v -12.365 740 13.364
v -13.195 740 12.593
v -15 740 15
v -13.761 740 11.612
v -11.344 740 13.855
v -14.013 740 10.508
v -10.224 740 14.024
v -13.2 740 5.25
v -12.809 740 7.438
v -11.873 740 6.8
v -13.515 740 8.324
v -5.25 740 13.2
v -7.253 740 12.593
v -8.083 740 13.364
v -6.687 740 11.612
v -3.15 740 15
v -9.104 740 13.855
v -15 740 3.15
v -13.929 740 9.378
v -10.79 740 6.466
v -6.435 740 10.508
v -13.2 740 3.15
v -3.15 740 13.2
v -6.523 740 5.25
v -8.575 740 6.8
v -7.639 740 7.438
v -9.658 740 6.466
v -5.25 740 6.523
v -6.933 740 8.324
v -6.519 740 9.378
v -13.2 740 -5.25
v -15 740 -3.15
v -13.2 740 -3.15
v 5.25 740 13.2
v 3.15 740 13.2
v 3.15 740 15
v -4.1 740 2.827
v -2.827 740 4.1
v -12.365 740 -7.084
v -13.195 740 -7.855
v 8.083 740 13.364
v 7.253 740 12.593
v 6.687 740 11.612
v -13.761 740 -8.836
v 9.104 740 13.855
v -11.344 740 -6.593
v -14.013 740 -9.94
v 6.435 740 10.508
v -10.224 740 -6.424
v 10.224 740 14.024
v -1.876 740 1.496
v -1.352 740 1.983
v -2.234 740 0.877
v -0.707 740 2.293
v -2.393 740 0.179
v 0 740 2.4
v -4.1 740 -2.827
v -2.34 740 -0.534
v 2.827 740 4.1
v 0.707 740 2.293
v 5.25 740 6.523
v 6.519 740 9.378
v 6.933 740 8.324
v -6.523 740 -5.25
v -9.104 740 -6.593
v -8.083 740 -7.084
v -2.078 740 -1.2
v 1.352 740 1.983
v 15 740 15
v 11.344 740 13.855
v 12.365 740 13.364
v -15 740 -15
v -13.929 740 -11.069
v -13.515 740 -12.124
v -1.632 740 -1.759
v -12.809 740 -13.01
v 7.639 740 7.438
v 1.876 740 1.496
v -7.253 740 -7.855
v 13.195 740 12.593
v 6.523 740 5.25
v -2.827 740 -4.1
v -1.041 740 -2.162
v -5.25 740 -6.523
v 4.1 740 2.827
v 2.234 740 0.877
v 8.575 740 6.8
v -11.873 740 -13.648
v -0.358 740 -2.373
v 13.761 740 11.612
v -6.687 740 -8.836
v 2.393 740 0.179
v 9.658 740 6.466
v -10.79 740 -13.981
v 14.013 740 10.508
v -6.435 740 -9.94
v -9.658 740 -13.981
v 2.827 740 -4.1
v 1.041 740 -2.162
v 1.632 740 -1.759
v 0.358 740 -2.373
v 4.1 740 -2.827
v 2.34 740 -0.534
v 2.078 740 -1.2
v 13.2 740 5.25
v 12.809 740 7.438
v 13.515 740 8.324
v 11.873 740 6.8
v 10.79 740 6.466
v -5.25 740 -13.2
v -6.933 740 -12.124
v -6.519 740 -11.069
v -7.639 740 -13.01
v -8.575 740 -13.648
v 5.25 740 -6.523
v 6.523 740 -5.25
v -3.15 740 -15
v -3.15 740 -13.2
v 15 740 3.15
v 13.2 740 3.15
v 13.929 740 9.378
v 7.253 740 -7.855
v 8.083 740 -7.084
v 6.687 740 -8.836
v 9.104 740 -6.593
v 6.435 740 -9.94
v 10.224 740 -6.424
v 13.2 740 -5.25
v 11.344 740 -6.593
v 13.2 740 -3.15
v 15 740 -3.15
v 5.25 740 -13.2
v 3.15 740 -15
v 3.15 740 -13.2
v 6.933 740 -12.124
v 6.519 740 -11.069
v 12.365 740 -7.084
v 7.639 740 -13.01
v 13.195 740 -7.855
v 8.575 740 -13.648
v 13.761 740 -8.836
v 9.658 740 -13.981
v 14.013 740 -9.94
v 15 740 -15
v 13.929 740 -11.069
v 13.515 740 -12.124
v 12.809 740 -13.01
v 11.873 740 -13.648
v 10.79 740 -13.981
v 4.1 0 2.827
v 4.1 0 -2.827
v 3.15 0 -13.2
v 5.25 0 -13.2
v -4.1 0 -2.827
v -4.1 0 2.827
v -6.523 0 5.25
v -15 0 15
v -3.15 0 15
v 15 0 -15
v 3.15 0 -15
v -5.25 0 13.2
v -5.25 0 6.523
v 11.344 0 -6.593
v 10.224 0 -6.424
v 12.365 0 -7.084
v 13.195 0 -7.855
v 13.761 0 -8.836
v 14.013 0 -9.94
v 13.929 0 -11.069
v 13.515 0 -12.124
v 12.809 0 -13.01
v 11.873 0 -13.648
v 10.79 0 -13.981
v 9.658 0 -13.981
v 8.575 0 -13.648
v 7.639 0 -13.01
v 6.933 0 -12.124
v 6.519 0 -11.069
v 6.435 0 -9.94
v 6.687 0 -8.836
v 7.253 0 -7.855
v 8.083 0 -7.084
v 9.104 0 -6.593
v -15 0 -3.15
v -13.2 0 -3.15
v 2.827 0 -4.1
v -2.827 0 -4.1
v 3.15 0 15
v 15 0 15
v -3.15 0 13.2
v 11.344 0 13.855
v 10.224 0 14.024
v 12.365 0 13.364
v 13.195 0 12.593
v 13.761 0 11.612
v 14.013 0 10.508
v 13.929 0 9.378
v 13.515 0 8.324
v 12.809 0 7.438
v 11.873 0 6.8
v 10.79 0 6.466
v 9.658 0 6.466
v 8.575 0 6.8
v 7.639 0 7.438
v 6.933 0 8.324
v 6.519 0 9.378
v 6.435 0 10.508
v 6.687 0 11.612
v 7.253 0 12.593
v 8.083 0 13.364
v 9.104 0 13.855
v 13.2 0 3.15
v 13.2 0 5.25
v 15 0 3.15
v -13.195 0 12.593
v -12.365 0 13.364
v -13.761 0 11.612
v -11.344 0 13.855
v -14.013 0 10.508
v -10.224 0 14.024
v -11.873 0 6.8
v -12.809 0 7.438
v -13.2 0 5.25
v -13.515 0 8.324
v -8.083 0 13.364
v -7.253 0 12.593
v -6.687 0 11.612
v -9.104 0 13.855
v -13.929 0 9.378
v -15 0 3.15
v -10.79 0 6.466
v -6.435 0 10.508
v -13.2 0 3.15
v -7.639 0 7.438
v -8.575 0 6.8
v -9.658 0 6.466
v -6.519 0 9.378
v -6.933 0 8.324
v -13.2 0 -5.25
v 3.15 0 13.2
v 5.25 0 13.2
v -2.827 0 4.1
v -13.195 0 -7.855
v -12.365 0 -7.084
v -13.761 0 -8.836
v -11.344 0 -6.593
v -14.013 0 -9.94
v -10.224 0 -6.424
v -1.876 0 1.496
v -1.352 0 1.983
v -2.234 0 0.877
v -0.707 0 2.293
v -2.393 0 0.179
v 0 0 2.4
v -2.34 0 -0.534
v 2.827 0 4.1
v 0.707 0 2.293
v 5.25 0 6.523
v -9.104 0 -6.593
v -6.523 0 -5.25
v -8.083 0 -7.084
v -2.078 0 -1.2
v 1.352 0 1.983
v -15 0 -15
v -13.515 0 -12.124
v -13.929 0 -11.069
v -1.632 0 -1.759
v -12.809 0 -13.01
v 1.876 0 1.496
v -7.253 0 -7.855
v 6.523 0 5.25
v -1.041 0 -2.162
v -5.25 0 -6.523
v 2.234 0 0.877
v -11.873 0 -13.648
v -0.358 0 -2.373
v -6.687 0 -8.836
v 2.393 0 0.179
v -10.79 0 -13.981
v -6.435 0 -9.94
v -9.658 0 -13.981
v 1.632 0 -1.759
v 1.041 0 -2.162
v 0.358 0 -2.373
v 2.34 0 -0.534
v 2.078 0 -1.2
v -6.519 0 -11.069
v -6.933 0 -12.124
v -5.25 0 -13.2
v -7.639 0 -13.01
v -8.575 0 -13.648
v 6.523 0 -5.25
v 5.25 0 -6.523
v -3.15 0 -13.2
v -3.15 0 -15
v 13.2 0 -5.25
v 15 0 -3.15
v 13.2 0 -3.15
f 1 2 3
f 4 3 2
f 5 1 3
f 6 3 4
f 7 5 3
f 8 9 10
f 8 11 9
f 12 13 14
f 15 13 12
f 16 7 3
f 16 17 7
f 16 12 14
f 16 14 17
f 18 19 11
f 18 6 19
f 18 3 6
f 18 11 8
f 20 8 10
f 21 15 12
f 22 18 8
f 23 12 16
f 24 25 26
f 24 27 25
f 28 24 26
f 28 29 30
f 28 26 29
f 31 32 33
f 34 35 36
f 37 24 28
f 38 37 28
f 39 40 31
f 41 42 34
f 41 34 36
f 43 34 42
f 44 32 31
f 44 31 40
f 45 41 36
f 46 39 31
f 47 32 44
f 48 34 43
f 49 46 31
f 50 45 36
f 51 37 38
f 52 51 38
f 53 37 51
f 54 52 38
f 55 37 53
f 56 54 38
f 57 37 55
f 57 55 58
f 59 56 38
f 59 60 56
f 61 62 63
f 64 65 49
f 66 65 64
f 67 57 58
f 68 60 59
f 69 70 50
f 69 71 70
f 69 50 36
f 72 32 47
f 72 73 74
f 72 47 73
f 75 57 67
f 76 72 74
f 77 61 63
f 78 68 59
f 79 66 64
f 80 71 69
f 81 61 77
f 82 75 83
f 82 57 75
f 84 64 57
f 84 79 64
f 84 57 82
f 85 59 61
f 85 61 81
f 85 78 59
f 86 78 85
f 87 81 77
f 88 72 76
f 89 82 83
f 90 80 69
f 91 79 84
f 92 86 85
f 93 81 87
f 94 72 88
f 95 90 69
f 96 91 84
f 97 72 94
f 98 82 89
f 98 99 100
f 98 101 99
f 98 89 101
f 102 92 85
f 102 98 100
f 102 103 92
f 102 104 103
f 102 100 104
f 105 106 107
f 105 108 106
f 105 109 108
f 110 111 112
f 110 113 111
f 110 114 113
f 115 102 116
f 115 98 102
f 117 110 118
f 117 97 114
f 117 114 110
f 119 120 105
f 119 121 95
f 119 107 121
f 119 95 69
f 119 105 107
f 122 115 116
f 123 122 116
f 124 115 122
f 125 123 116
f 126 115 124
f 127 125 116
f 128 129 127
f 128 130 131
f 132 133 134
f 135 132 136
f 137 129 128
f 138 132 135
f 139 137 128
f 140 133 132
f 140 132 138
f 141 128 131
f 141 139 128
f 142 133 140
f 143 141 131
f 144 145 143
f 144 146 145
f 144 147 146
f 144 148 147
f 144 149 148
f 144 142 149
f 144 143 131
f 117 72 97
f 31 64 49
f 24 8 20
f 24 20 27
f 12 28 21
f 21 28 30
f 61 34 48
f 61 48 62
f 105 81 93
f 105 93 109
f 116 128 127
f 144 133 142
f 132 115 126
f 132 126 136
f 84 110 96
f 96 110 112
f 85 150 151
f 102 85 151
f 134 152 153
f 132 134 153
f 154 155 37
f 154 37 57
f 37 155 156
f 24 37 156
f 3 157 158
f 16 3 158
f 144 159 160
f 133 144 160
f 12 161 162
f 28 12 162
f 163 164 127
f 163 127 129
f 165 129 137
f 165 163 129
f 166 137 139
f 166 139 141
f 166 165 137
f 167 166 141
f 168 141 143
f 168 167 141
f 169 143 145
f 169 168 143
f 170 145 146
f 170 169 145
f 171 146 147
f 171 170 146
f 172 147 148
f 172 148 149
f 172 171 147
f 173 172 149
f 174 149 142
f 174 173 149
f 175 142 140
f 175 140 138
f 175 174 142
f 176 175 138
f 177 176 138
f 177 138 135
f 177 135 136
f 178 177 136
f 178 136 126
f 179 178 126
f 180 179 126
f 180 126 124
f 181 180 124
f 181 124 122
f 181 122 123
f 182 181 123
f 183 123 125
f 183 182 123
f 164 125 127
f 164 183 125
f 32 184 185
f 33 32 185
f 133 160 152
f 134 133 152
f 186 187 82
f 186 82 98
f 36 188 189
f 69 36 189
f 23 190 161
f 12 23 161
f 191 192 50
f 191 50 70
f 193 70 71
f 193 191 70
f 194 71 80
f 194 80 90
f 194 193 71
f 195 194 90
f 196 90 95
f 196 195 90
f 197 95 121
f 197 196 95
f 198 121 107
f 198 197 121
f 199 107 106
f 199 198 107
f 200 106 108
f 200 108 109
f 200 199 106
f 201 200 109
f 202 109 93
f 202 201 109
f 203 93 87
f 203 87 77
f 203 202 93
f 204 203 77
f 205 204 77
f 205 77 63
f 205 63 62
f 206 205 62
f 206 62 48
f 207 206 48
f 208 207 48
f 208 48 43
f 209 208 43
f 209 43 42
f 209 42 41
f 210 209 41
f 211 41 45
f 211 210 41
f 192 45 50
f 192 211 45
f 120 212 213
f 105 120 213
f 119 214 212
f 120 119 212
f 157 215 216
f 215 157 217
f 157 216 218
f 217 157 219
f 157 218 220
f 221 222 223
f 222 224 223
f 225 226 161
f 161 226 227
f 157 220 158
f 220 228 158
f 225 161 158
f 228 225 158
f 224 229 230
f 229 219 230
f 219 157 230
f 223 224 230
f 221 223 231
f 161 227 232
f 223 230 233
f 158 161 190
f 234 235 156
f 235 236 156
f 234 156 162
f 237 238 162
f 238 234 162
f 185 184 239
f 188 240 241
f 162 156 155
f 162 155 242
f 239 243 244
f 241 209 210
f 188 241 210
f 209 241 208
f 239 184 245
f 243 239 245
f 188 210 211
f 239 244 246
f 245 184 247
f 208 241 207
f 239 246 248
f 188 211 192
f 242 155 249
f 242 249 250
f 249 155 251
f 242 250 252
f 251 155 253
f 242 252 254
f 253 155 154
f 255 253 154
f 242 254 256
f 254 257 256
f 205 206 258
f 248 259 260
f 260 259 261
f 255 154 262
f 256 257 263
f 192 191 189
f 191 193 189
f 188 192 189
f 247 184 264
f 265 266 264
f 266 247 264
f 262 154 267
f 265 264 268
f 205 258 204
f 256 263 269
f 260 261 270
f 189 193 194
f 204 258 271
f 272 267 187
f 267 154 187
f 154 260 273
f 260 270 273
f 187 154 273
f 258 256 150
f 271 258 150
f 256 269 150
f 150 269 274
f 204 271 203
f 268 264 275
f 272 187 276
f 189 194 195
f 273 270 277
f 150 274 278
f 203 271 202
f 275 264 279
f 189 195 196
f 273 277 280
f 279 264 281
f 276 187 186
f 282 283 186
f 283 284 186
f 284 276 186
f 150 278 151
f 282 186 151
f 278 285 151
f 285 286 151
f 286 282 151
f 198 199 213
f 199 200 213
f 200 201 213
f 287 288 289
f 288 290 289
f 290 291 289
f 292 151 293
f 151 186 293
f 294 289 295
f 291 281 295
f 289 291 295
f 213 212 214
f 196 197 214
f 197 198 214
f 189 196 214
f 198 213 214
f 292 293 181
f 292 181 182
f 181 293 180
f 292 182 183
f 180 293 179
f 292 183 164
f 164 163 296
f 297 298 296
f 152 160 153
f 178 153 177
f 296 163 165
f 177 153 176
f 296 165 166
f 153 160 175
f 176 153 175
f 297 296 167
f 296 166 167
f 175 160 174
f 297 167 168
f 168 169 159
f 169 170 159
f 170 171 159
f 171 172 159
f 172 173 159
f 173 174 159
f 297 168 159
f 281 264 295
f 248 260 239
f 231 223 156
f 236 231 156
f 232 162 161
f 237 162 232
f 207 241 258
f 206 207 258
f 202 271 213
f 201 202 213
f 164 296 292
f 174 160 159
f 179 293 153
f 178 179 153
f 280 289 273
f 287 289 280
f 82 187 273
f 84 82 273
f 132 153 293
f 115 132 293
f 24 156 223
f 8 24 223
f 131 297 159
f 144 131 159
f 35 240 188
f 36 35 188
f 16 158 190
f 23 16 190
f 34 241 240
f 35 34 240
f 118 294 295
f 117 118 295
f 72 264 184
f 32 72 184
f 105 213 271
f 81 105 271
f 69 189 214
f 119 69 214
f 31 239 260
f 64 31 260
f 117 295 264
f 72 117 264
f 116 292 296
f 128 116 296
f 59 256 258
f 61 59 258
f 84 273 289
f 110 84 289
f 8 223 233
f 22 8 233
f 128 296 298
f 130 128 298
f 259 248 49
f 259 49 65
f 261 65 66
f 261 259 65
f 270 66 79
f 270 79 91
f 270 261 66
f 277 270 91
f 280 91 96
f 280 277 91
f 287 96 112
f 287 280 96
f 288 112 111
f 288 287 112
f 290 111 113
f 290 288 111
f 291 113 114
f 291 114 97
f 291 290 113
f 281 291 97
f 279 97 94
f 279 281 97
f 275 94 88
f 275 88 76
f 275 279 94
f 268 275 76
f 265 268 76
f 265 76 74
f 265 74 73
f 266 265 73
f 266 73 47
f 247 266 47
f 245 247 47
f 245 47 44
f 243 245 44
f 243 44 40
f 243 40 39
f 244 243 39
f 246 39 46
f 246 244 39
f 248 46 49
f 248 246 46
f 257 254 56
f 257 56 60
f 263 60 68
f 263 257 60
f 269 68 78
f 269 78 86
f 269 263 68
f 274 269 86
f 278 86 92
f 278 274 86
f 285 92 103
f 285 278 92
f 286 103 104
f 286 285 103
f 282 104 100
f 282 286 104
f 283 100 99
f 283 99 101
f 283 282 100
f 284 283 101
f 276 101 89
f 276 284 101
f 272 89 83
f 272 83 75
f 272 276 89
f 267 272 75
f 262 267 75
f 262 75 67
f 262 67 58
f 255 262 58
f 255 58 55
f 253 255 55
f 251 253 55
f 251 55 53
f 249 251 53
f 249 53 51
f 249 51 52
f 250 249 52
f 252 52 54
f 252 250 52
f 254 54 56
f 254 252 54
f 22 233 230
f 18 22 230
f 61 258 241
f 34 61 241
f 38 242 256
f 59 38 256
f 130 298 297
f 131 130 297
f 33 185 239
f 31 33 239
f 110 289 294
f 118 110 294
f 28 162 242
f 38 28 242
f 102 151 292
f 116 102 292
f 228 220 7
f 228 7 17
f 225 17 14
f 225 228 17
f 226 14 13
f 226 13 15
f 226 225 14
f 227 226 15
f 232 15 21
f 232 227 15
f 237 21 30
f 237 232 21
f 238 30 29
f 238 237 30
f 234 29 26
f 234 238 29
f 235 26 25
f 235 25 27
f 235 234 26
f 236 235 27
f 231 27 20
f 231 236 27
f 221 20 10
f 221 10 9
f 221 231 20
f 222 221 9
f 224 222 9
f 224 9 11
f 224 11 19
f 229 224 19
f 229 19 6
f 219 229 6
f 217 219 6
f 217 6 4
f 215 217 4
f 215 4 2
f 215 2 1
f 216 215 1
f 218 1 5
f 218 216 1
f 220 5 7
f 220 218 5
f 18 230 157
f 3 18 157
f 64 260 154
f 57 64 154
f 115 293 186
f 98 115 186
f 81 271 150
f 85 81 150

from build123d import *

# Parameters (mm, degrees)
SKETCH_2_R      = 3.8
SKETCH_2_W      = 8.2
SKETCH_2_H      = 8.2
SKETCH_2_R_2    = 2.4
EXTRUDE_1_DEPTH = 740


with BuildPart() as part:
    # 草图2 → 凸台-拉伸1 (new body)
    # profile 1 of 5: a face of its own
    with BuildSketch(Plane(origin=(0, 0, 0), x_dir=(1, 0, 0), z_dir=(0, 1, 0))):
        Polygon((-13.2, -3.15), (-15, -3.15), (-15, -15), (-3.15, -15), (-3.15, -13.2), (-5.25, -13.2), (-5.25, -6.522792206), (-2.827207794, -4.1), (-4.1, -4.1), (-4.1, -2.827207794), (-6.522792206, -5.25), (-13.2, -5.25), align=None)
        with Locations(Location((-10.223905857, -10.223905857, 0), (0, 0, 270))):
            Circle(SKETCH_2_R, mode=Mode.SUBTRACT)
    # profile 2 of 5: a face of its own
    with BuildSketch(Plane(origin=(0, 0, 0), x_dir=(1, 0, 0), z_dir=(0, 1, 0))):
        Rectangle(SKETCH_2_W, SKETCH_2_H)
        with Locations(Location((0, 0, 0), (0, 0, 270))):
            Circle(SKETCH_2_R_2, mode=Mode.SUBTRACT)
    # profile 3 of 5: a face of its own
    with BuildSketch(Plane(origin=(0, 0, 0), x_dir=(1, 0, 0), z_dir=(0, 1, 0))):
        Polygon((15, -15), (15, -3.15), (13.2, -3.15), (13.2, -5.25), (6.522792206, -5.25), (4.1, -2.827207794), (4.1, -4.1), (2.827207794, -4.1), (5.25, -6.522792206), (5.25, -13.2), (3.15, -13.2), (3.15, -15), align=None)
        with Locations(Location((10.223905857, -10.223905857, 0), (0, 0, 270))):
            Circle(SKETCH_2_R, mode=Mode.SUBTRACT)
    # profile 4 of 5: a face of its own
    with BuildSketch(Plane(origin=(0, 0, 0), x_dir=(1, 0, 0), z_dir=(0, 1, 0))):
        Polygon((15, 15), (3.15, 15), (3.15, 13.2), (5.25, 13.2), (5.25, 6.522792206), (2.827207794, 4.1), (4.1, 4.1), (4.1, 2.827207794), (6.522792206, 5.25), (13.2, 5.25), (13.2, 3.15), (15, 3.15), align=None)
        with Locations(Location((10.223905857, 10.223905857, 0), (0, 0, 270))):
            Circle(SKETCH_2_R, mode=Mode.SUBTRACT)
    # profile 5 of 5: a face of its own
    with BuildSketch(Plane(origin=(0, 0, 0), x_dir=(1, 0, 0), z_dir=(0, 1, 0))):
        Polygon((-3.15, 13.2), (-3.15, 15), (-15, 15), (-15, 3.15), (-13.2, 3.15), (-13.2, 5.25), (-6.522792206, 5.25), (-4.1, 2.827207794), (-4.1, 4.1), (-2.827207794, 4.1), (-5.25, 6.522792206), (-5.25, 13.2), align=None)
        with Locations(Location((-10.223905857, 10.223905857, 0), (0, 0, 270))):
            Circle(SKETCH_2_R, mode=Mode.SUBTRACT)
    extrude(amount=EXTRUDE_1_DEPTH)


solid = part.part
